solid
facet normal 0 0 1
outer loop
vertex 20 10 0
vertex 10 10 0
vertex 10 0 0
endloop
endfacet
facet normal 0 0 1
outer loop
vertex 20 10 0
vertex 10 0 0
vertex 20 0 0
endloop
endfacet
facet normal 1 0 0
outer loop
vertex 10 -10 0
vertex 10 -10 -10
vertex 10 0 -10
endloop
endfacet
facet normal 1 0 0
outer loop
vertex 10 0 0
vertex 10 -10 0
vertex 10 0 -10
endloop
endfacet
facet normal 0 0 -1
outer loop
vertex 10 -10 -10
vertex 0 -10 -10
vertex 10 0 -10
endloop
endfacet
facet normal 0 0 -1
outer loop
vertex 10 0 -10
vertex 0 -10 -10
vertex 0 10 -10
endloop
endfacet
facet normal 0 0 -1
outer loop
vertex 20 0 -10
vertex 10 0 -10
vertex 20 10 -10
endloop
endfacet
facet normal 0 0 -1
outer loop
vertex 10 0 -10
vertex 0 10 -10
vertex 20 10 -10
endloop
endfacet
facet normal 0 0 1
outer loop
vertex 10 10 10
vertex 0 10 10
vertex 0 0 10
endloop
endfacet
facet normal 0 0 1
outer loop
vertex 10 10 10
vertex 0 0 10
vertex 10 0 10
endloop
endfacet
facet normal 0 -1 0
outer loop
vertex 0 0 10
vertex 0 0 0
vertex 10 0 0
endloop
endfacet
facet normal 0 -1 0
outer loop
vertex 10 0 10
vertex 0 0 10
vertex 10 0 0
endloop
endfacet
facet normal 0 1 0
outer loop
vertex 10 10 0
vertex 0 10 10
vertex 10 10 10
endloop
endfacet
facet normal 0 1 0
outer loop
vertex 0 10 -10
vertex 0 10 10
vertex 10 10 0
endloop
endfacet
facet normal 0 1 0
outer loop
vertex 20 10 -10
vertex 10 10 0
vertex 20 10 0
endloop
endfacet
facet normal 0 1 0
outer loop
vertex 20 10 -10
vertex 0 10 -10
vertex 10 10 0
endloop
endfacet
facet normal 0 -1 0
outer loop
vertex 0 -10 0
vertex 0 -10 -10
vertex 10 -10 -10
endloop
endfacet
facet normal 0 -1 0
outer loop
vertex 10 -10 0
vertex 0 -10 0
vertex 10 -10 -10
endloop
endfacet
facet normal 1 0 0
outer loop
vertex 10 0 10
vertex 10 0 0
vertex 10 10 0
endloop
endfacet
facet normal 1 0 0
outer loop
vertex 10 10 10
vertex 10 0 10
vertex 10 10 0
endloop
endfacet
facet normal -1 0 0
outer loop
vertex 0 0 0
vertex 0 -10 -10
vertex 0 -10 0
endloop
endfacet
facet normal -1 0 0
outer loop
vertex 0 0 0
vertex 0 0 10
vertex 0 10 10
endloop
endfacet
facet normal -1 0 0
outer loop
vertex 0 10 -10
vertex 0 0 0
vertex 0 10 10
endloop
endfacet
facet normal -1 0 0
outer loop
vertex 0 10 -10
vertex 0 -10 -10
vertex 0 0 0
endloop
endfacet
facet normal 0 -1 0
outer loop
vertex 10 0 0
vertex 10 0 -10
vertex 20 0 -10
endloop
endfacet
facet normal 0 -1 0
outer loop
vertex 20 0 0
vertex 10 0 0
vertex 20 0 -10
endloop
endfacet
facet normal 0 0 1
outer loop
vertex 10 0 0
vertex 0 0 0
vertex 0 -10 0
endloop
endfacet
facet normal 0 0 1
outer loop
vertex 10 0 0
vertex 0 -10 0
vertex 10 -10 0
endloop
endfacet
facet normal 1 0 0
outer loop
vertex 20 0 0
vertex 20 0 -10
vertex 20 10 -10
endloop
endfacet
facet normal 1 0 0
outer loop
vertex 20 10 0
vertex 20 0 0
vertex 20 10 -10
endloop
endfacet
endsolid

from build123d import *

# Parameters (mm, degrees)
BOX002_W     = 10
BOX002_H     = 10
BOX002_DEPTH = 10
BOX003_W     = 10
BOX003_H     = 10
BOX003_DEPTH = 10
BOX001_W     = 10
BOX001_H     = 10
BOX001_DEPTH = 10
BOX_W        = 10
BOX_H        = 10
BOX_DEPTH    = 10


with BuildPart() as nivel2_cubo1:
    # Box002 → Box002 (new body)
    with BuildSketch(Plane(origin=(0, -10, -10), x_dir=(1, 0, 0), z_dir=(0, 0, 1))):
        with Locations((5, 5)):
            Rectangle(BOX002_W, BOX002_H)
    extrude(amount=BOX002_DEPTH)


with BuildPart() as fusion001:
    # Box003 → Box003 (new body)
    with BuildSketch(Plane(origin=(10, 0, -10), x_dir=(1, 0, 0), z_dir=(0, 0, 1))):
        with Locations((5, 5)):
            Rectangle(BOX003_W, BOX003_H)
    extrude(amount=BOX003_DEPTH)

    # Fusion001: union Nivel2-Cubo1
    add(nivel2_cubo1.part)


with BuildPart() as nivel2_cubocentro:
    # Box001 → Box001 (new body)
    with BuildSketch(Plane.XY.offset(-10)):
        with Locations((5, 5)):
            Rectangle(BOX001_W, BOX001_H)
    extrude(amount=BOX001_DEPTH)


with BuildPart() as fusion002:
    # Box → Box (new body)
    with BuildSketch(Plane.XY):
        with Locations((5, 5)):
            Rectangle(BOX_W, BOX_H)
    extrude(amount=BOX_DEPTH)

    # Fusion: union Nivel2-Cubocentro
    add(nivel2_cubocentro.part)

    # Fusion002: union Fusion001
    add(fusion001.part)


solid = fusion002.part
